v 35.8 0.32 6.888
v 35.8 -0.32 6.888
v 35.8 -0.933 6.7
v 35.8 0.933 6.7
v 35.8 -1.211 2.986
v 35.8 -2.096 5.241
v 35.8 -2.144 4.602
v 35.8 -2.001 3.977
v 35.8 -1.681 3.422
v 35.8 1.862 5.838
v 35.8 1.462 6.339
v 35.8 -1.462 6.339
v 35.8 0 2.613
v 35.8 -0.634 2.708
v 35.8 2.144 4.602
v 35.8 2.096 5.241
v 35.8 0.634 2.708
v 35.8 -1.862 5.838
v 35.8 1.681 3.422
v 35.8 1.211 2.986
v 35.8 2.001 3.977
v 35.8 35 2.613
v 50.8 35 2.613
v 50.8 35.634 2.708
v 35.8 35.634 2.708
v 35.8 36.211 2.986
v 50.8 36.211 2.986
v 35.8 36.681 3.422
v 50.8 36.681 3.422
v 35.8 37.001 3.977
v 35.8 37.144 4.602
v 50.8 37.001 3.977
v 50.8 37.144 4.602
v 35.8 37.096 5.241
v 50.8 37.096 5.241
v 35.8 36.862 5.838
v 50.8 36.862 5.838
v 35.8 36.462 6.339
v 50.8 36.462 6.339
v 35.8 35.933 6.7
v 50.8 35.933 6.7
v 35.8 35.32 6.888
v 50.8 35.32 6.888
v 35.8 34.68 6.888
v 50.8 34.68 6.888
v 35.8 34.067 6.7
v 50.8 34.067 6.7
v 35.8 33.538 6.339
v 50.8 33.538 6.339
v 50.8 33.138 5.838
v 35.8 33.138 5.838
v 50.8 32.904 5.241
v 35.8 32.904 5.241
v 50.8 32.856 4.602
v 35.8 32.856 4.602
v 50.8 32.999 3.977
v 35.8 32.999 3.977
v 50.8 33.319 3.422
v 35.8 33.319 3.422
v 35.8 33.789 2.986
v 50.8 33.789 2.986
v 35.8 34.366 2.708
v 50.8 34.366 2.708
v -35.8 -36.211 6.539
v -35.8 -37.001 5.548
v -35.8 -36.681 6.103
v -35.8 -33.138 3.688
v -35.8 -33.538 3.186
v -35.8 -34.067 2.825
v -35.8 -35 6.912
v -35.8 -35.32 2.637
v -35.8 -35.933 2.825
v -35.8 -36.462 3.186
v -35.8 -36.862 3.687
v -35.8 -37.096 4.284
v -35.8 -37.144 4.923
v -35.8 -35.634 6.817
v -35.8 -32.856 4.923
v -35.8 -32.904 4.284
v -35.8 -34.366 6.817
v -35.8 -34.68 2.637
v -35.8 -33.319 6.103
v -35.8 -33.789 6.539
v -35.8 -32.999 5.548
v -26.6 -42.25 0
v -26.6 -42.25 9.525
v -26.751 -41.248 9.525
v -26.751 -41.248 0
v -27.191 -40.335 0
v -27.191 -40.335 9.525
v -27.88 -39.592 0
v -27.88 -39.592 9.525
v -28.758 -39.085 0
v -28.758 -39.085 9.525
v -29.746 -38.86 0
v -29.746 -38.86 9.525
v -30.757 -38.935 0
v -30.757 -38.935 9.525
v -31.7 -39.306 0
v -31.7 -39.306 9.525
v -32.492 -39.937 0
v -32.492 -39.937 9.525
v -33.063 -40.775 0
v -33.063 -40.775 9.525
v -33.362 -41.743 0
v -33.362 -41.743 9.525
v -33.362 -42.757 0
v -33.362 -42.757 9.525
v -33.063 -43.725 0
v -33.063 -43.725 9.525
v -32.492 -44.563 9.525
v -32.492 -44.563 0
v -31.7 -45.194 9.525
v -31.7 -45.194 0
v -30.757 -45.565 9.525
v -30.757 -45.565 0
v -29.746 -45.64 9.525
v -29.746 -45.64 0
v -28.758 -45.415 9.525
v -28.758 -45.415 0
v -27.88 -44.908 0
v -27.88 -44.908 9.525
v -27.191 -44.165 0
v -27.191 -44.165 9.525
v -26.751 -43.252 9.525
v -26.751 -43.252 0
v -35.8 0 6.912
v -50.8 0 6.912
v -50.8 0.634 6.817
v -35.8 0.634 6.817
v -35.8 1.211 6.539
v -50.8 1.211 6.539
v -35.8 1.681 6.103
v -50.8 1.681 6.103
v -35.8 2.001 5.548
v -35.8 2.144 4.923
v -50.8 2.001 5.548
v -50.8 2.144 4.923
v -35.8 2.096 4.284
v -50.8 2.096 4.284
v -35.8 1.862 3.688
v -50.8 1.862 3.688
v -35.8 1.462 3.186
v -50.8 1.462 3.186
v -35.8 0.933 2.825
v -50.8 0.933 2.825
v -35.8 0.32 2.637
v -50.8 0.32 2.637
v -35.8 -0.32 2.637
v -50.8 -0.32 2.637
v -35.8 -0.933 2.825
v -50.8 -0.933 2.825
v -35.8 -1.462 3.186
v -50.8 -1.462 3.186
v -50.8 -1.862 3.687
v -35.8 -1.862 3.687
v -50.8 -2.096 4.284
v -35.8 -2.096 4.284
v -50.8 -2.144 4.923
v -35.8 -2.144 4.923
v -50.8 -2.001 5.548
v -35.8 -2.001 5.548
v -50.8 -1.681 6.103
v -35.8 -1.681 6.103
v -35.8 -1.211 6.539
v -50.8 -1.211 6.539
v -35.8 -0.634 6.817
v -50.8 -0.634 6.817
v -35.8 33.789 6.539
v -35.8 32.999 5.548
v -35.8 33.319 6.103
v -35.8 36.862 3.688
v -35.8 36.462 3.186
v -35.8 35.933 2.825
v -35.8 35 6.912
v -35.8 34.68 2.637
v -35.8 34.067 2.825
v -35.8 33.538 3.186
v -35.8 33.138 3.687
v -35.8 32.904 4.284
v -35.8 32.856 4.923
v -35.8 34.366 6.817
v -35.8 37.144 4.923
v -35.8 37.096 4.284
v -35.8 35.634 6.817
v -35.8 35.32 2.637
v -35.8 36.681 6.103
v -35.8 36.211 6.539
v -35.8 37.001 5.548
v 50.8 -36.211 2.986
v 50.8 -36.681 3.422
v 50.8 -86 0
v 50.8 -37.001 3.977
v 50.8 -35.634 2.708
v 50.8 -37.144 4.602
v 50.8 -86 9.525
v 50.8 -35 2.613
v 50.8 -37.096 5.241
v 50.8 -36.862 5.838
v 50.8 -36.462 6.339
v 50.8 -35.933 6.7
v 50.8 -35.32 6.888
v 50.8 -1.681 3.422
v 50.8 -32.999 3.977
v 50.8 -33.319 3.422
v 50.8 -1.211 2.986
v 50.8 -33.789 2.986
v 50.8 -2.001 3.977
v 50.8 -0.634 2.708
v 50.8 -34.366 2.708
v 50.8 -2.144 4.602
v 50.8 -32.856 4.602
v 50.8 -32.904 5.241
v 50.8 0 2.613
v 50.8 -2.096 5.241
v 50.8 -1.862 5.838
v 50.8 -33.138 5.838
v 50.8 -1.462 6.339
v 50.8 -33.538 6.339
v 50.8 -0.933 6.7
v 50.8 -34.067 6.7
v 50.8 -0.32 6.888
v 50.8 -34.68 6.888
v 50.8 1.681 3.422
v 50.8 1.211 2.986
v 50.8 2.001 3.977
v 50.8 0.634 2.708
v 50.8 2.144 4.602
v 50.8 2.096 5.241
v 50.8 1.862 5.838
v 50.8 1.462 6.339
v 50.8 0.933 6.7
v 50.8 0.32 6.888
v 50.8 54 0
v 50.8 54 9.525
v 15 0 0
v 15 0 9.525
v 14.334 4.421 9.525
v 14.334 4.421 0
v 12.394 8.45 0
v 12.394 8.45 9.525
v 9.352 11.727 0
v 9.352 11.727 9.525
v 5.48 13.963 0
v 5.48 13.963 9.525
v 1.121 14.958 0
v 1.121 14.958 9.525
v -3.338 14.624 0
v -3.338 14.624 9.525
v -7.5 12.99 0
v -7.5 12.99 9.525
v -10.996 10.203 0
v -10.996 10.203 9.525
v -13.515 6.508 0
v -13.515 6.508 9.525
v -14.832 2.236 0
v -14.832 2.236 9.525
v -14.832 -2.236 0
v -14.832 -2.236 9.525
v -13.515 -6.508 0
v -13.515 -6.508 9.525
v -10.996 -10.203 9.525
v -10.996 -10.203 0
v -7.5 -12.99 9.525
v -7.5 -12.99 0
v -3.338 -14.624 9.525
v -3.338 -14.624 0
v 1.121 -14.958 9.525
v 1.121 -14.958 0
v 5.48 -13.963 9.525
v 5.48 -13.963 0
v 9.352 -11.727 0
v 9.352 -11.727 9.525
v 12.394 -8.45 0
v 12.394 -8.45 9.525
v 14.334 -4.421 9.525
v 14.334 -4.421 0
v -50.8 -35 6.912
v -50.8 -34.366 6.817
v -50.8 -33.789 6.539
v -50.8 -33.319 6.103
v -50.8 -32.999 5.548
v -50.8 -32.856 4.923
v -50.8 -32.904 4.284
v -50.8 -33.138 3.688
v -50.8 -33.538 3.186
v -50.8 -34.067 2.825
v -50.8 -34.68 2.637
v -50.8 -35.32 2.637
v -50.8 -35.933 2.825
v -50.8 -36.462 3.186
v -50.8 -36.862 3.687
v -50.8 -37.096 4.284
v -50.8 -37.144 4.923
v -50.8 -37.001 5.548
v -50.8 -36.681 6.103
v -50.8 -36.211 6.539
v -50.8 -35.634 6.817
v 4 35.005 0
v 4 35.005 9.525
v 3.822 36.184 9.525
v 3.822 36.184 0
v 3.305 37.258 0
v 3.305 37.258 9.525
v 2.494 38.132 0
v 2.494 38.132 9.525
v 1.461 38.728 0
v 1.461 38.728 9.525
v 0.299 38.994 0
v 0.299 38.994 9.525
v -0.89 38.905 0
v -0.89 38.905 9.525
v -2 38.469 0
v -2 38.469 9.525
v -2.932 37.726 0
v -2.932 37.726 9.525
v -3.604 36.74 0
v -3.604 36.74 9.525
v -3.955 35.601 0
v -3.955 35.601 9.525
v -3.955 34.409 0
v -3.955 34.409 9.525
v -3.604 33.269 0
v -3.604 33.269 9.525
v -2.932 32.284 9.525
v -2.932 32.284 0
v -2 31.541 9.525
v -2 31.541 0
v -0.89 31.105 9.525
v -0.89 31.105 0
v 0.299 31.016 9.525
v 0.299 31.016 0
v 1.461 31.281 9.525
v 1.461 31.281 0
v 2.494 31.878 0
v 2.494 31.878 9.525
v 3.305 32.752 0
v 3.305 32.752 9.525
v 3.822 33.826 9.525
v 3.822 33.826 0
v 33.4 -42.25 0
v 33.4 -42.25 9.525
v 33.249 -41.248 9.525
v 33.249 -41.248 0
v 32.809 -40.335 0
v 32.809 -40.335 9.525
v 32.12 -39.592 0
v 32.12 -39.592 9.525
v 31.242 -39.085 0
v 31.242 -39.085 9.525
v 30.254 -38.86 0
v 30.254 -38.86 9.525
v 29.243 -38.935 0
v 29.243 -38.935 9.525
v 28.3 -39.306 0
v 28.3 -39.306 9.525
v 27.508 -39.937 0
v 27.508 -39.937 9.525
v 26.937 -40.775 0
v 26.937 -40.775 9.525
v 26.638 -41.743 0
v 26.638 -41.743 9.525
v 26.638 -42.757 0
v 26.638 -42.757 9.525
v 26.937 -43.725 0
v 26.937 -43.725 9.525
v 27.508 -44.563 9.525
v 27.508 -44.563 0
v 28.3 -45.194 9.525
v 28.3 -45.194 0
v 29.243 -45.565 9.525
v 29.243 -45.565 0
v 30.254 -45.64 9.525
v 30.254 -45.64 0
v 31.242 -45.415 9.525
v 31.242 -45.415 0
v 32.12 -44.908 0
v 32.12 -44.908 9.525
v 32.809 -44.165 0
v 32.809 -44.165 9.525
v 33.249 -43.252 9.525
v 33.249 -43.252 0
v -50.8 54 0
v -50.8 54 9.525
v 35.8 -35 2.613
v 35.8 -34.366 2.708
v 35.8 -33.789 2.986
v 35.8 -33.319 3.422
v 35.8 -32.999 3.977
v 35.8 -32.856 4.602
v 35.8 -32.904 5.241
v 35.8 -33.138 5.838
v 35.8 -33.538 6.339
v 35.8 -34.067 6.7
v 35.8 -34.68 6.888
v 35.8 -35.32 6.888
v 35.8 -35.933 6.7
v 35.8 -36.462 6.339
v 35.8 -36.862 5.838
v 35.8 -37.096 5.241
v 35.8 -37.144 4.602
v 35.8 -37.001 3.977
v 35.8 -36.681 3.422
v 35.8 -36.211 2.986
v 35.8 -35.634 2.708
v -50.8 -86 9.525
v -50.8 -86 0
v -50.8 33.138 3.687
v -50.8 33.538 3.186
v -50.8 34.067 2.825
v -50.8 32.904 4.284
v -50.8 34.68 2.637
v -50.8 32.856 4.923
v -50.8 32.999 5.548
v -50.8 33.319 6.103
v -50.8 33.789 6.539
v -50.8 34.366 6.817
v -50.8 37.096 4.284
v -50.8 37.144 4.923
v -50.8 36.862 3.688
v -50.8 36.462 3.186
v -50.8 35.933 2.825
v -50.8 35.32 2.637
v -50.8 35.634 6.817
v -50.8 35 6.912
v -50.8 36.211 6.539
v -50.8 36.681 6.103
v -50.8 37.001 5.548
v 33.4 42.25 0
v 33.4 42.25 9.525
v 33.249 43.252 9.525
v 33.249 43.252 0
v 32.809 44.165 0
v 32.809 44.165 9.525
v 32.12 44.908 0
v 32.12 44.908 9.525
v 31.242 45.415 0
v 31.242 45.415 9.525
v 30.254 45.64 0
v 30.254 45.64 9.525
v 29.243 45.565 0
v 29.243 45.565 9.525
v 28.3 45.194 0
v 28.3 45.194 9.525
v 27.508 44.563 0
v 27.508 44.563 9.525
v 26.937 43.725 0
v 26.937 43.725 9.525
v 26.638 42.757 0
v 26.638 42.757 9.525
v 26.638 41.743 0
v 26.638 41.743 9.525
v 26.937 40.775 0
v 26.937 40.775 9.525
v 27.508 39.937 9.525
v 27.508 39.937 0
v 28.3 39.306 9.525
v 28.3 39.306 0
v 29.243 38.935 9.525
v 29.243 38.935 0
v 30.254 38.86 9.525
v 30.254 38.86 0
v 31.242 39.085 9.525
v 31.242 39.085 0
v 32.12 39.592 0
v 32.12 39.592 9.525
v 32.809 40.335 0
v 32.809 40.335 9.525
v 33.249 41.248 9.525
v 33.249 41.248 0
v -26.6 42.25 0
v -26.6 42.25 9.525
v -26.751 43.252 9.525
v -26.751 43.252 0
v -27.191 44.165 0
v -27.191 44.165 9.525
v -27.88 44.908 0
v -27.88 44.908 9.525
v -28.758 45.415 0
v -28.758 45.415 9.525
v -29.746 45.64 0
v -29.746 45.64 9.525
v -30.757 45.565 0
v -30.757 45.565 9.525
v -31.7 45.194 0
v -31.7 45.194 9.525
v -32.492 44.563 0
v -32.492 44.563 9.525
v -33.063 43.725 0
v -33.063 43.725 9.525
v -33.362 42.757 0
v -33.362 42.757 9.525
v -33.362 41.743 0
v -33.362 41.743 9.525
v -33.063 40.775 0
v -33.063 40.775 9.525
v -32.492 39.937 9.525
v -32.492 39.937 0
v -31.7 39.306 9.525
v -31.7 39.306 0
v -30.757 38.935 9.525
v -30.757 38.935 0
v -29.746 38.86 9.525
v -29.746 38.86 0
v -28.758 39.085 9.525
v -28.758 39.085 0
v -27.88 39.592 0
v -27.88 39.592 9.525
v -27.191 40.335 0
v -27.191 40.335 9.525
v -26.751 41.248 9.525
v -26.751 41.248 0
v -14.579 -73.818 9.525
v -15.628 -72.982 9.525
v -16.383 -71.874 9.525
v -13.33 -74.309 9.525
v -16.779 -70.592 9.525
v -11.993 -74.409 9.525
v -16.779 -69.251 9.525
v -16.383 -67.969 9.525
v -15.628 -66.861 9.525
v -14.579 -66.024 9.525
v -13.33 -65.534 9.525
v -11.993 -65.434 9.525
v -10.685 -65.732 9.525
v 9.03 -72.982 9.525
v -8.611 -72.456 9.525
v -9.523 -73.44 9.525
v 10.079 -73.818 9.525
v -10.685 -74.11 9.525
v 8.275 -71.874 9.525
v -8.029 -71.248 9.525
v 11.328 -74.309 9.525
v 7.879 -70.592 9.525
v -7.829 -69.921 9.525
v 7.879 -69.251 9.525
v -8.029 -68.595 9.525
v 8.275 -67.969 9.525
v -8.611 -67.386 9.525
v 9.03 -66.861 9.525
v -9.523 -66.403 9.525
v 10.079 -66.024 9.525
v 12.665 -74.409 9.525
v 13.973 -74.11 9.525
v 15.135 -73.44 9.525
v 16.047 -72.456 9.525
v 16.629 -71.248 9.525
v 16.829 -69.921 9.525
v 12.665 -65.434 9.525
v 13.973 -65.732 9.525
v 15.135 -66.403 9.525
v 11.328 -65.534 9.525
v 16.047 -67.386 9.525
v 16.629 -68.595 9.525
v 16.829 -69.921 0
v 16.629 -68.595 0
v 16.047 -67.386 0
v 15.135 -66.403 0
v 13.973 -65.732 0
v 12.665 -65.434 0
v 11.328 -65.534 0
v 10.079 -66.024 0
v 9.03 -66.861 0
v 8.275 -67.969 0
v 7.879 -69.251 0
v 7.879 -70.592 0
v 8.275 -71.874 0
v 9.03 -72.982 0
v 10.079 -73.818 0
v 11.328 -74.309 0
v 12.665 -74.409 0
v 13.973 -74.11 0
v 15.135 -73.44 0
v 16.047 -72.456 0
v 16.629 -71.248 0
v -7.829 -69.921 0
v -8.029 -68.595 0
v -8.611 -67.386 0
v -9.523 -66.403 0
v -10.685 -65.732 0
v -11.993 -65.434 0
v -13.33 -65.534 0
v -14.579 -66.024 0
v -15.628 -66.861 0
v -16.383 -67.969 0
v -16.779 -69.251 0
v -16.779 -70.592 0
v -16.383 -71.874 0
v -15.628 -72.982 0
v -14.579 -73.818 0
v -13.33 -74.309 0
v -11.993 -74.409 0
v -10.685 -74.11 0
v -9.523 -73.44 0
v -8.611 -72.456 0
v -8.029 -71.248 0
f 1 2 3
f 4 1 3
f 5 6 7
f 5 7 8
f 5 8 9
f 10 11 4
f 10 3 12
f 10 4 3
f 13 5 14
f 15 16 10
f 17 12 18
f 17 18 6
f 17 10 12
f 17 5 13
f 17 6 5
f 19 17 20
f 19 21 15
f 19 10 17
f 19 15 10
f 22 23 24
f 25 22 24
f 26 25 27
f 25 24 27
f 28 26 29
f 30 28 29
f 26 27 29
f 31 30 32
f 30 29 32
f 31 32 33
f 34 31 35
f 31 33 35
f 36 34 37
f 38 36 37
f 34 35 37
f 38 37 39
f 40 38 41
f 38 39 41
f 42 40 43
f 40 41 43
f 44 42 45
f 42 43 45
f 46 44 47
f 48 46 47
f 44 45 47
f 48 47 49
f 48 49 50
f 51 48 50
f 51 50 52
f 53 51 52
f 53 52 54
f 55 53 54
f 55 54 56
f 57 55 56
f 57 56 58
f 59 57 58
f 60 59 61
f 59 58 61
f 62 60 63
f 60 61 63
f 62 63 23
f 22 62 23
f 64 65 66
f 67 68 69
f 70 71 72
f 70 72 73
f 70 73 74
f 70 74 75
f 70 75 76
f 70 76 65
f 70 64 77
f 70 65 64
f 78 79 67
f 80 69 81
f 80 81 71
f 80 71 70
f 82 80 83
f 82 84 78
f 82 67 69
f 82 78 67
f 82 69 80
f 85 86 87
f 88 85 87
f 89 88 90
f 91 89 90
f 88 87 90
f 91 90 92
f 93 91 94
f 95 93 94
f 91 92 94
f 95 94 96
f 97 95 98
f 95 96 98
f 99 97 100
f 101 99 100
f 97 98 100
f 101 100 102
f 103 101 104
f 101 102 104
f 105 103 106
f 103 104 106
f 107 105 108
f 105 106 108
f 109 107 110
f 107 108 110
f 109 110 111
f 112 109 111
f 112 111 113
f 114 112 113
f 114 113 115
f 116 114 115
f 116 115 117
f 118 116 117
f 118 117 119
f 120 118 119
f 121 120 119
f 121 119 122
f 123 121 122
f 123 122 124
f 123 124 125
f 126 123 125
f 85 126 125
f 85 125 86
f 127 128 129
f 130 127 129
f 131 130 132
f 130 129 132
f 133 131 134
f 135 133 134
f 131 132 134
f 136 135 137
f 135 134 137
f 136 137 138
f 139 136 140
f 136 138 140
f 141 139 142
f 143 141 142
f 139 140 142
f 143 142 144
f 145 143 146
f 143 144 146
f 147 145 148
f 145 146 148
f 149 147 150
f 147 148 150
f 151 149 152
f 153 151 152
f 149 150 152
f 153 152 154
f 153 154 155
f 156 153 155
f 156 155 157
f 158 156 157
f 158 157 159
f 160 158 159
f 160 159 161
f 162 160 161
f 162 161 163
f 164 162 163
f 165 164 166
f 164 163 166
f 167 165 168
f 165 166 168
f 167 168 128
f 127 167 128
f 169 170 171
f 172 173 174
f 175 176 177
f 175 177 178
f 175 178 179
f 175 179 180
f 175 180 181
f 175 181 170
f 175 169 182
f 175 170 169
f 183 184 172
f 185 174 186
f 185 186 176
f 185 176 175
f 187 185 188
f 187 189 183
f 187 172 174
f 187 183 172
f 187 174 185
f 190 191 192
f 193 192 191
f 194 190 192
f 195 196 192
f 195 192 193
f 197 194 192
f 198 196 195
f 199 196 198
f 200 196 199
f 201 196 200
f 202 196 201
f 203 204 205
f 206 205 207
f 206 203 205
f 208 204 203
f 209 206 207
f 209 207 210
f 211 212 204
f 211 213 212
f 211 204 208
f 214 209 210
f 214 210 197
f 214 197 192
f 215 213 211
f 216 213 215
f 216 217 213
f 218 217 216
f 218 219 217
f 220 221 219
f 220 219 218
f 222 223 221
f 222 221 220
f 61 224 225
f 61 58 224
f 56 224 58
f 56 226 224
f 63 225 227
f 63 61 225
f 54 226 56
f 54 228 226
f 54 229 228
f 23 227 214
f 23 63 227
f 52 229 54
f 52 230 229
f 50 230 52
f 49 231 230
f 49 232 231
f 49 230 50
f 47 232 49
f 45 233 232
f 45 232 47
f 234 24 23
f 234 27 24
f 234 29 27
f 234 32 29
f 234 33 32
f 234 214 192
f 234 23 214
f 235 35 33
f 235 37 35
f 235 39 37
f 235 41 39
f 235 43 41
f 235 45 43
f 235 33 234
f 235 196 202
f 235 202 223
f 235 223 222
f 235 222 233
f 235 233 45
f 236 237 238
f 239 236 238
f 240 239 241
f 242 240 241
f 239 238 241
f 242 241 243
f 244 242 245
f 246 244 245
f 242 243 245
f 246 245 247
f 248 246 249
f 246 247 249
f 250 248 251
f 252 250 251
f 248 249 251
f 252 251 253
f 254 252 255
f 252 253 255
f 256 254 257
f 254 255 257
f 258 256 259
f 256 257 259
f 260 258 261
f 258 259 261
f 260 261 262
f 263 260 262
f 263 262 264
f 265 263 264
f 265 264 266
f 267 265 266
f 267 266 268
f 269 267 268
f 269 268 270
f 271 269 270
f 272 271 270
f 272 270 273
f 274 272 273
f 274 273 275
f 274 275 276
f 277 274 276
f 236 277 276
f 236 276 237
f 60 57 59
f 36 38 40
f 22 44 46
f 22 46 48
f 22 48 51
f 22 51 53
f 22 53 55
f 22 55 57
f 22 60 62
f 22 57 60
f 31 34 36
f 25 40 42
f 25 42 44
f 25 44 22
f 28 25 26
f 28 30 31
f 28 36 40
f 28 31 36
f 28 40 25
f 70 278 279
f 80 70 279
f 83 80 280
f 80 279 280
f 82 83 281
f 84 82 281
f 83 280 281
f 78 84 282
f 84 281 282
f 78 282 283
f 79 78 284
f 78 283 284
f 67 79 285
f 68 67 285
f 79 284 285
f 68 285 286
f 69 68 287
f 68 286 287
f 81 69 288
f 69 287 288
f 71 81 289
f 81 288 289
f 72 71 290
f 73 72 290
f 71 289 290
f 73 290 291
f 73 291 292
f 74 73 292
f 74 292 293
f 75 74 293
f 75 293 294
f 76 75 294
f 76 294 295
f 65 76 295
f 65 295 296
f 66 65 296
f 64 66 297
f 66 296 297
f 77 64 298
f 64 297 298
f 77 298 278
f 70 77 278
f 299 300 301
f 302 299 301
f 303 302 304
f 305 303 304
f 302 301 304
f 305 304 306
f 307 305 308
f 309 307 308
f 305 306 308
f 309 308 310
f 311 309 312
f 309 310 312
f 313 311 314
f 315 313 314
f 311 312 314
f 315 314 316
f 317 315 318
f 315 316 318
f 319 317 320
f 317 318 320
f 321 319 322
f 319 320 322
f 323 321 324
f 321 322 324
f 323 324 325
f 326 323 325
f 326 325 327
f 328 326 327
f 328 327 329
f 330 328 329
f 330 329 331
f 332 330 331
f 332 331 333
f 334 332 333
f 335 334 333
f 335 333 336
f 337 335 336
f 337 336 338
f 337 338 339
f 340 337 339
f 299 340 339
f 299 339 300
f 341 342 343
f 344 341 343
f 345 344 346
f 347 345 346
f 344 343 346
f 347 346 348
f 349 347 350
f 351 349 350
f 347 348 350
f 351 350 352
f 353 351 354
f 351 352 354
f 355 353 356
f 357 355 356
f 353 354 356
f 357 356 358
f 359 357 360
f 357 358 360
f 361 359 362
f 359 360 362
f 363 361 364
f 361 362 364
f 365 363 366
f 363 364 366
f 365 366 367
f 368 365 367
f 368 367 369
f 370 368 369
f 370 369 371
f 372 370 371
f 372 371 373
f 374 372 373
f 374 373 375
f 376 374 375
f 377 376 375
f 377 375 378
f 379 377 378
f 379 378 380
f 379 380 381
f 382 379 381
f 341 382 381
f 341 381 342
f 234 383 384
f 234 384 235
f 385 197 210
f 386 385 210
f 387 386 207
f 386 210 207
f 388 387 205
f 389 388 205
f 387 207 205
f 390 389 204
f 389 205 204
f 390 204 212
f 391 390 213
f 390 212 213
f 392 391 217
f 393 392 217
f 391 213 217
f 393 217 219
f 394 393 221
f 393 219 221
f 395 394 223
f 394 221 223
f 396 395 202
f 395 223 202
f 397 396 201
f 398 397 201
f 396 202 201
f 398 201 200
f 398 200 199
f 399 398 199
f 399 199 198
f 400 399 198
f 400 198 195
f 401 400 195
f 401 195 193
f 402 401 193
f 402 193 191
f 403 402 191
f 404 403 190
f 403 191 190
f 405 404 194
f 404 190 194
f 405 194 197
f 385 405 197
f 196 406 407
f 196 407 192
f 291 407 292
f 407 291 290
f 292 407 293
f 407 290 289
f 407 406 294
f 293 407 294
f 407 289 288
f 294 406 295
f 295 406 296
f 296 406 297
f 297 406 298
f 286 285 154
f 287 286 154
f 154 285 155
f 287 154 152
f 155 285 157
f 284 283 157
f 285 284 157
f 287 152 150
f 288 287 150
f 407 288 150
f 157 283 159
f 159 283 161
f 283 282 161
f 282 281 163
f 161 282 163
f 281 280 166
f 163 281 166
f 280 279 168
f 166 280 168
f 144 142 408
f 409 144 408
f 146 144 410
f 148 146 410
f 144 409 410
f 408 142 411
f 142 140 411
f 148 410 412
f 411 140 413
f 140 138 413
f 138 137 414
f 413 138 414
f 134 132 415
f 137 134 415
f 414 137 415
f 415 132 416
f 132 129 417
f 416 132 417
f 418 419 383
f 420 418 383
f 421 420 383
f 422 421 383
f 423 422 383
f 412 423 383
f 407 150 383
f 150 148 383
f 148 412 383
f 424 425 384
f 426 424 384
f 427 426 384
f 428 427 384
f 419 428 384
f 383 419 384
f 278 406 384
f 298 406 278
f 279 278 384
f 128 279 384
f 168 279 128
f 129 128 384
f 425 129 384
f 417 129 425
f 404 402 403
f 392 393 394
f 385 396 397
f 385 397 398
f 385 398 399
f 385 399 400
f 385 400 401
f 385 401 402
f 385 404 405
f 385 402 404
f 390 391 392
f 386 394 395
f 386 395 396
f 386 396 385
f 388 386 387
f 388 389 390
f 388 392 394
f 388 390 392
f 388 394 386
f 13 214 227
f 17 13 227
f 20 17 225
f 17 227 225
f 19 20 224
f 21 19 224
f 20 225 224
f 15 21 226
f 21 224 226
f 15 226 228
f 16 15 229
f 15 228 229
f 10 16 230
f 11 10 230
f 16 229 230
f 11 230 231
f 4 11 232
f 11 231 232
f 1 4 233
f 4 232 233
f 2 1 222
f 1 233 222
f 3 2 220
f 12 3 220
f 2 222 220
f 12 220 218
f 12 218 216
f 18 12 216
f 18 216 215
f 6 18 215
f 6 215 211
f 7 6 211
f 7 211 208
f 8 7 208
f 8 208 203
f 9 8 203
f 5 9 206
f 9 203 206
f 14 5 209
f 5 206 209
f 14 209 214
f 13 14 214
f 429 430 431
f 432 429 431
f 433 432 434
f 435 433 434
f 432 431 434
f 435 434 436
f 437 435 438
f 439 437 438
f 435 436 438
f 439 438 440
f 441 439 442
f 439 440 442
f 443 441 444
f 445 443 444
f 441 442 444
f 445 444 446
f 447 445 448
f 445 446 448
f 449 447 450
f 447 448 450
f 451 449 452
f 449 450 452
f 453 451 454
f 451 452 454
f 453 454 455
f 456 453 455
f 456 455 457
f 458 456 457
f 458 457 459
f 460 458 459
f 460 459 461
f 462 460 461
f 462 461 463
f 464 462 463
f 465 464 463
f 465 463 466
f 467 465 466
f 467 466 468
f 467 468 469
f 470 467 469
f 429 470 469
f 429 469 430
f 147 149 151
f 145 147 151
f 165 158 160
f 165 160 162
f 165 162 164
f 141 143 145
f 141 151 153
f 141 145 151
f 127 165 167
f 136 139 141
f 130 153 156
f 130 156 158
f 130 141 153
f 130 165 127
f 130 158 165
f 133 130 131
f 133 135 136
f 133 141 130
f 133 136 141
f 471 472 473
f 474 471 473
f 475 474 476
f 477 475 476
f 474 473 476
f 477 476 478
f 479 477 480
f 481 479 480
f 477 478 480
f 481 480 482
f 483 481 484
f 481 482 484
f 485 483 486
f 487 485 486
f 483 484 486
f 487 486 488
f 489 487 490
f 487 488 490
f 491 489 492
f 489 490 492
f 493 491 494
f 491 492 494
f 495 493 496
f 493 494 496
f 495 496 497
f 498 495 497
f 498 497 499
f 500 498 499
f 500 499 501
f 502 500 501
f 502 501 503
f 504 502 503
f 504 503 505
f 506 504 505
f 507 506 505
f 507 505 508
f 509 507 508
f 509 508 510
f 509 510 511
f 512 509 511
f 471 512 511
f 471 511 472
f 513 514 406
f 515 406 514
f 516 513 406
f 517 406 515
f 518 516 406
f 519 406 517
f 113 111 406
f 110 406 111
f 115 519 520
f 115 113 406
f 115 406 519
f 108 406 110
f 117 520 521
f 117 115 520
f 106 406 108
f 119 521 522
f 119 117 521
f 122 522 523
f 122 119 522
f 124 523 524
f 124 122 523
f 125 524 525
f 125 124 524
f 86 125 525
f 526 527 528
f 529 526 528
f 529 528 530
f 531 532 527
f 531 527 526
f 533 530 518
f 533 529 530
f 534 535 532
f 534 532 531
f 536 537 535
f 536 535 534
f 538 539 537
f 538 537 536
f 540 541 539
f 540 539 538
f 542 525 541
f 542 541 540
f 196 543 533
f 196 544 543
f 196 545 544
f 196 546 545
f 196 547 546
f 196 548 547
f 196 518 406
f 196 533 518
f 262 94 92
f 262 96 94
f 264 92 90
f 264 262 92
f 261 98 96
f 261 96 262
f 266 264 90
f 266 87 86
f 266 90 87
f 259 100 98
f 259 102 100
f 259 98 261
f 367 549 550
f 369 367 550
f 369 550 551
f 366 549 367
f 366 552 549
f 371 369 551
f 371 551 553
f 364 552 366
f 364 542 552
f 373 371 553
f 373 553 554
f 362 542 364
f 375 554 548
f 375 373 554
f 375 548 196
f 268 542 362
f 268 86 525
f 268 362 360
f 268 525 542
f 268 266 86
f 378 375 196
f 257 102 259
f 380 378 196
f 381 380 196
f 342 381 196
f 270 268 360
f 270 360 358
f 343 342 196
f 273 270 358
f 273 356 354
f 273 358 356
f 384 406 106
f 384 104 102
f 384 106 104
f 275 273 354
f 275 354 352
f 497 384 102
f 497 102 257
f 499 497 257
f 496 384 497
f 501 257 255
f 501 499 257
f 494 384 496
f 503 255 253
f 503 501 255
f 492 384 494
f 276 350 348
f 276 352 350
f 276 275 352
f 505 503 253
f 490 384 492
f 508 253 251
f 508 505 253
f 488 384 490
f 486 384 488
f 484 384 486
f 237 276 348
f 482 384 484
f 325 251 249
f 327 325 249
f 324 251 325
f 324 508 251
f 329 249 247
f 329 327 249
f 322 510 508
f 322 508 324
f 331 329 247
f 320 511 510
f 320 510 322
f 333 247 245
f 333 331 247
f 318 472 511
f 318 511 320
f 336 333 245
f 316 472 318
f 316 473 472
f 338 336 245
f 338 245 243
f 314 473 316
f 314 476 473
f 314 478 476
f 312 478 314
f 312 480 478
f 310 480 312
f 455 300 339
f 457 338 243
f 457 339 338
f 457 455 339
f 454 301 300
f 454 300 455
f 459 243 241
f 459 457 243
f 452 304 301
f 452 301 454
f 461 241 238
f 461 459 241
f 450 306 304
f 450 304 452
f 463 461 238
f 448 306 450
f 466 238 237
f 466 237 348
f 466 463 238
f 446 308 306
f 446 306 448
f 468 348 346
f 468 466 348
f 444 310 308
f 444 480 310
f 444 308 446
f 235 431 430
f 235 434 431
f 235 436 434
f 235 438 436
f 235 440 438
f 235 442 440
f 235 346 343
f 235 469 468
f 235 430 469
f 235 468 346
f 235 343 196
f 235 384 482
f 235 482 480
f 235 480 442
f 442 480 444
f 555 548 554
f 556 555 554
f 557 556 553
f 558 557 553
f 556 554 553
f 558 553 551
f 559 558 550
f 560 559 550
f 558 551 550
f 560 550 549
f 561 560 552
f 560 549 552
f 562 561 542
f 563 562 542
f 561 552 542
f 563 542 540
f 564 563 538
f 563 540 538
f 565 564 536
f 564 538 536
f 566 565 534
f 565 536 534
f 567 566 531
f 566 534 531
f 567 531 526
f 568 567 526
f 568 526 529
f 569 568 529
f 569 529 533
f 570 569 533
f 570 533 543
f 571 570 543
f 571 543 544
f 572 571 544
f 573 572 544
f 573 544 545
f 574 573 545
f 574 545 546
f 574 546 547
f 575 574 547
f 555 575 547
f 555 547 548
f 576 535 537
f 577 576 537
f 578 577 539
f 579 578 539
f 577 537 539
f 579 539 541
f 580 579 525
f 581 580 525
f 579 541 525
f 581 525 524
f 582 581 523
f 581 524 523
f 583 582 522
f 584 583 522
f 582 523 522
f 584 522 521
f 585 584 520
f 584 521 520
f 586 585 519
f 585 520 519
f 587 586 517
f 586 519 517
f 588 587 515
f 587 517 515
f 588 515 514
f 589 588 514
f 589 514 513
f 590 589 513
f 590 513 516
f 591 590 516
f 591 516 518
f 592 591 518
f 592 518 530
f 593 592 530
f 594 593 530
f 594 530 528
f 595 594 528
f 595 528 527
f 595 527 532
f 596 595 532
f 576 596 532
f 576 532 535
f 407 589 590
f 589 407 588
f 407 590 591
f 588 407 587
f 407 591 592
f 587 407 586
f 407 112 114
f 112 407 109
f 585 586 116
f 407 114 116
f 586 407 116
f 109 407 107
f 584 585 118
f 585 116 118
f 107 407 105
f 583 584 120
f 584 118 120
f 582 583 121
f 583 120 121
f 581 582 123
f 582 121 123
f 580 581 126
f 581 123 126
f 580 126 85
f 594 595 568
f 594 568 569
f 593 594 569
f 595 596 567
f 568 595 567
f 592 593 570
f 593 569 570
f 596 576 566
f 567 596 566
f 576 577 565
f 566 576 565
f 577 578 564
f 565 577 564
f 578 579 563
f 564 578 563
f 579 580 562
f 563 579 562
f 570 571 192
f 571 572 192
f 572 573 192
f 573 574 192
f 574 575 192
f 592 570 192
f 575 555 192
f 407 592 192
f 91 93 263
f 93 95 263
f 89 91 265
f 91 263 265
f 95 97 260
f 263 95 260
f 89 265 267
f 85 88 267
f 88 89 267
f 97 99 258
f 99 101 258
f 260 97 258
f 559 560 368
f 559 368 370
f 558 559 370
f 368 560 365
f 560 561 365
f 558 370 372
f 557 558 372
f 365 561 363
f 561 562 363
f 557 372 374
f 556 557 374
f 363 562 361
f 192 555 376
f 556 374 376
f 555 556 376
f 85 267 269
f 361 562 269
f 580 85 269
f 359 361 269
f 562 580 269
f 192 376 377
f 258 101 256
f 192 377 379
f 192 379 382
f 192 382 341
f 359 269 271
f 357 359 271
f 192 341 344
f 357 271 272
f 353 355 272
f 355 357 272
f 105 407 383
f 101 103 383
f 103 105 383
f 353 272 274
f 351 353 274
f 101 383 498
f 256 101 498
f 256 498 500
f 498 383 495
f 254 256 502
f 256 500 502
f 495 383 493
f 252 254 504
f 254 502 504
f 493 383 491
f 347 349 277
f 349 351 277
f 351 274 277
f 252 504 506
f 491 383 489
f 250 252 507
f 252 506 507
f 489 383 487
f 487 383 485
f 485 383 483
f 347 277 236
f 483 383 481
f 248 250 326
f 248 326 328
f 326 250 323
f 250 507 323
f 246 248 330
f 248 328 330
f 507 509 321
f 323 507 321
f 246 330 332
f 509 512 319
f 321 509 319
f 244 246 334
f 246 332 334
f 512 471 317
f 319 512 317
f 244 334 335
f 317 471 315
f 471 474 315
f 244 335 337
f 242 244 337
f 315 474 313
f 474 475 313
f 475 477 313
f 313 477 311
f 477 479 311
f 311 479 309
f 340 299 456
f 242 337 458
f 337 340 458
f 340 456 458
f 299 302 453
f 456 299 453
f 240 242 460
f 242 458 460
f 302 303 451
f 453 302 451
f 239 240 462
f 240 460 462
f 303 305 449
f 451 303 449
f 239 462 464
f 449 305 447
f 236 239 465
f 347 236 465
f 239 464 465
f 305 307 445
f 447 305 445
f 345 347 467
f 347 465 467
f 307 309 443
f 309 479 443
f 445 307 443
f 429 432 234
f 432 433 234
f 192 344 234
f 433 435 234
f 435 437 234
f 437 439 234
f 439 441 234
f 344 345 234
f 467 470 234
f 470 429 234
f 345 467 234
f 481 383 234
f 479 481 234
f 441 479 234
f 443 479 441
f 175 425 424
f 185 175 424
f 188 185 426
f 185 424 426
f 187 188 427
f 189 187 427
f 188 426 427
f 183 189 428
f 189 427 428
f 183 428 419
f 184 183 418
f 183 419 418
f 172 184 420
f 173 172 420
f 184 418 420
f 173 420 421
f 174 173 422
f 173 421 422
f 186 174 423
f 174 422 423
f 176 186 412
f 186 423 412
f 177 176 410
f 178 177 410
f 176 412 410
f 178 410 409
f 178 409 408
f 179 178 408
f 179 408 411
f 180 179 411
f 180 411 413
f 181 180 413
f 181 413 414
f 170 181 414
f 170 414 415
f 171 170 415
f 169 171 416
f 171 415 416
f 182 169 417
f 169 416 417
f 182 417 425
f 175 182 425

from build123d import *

# Parameters (mm, degrees)
CROQUIS1_W              = 101.6
CROQUIS1_H              = 108
SALIENTE_EXTRUIR1_DEPTH = 9.525
CROQUIS2_R              = 15
CROQUIS2_R_2            = 3.4
CORTAR_EXTRUIR1_DEPTH   = 10.525
CROQUIS3_R              = 2.15
CORTAR_EXTRUIR2_DEPTH   = 15
CROQUIS4_R              = 2.15
CORTAR_EXTRUIR3_DEPTH   = 15
CROQUIS5_W              = 101.6
CROQUIS5_H              = 32
SALIENTE_EXTRUIR2_DEPTH = 9.525
CROQUIS6_R              = 4.5
CROQUIS6_R_2            = 4
CORTAR_EXTRUIR4_DEPTH   = 101.6


with BuildPart() as part:
    # Croquis1 → Saliente-Extruir1 (new body)
    with BuildSketch(Plane.XY):
        Rectangle(CROQUIS1_W, CROQUIS1_H)
    extrude(amount=SALIENTE_EXTRUIR1_DEPTH)

    # Croquis2 → Cortar-Extruir1 (cut, through all)
    with BuildSketch(Plane.XY.offset(9.525)):
        Circle(CROQUIS2_R)
        with Locations((30, -42.25)):
            Circle(CROQUIS2_R_2)
        with Locations((-30, -42.25)):
            Circle(CROQUIS2_R_2)
        with Locations((30, 42.25)):
            Circle(CROQUIS2_R_2)
        with Locations((-30, 42.25)):
            Circle(CROQUIS2_R_2)
    extrude(amount=-CORTAR_EXTRUIR1_DEPTH, mode=Mode.SUBTRACT)

    # Croquis3 → Cortar-Extruir2 (cut)
    with BuildSketch(Plane.ZY.offset(50.8)):
        with Locations((4.7625, 0)):
            Circle(CROQUIS3_R)
        with Locations((4.7625, -35)):
            Circle(CROQUIS3_R)
        with Locations((4.7625, 35)):
            Circle(CROQUIS3_R)
    extrude(amount=-CORTAR_EXTRUIR2_DEPTH, mode=Mode.SUBTRACT)

    # Croquis4 → Cortar-Extruir3 (cut)
    with BuildSketch(Plane(origin=(50.8, 0, 0), x_dir=(0, 0, -1), z_dir=(1, 0, 0))):
        with Locations((-4.7625, 0)):
            Circle(CROQUIS4_R)
        with Locations((-4.7625, -35)):
            Circle(CROQUIS4_R)
        with Locations((-4.7625, 35)):
            Circle(CROQUIS4_R)
    extrude(amount=-CORTAR_EXTRUIR3_DEPTH, mode=Mode.SUBTRACT)

    # Croquis5 → Saliente-Extruir2 (add)
    with BuildSketch(Plane.XY.offset(9.525)):
        with Locations((0, -70)):
            Rectangle(CROQUIS5_W, CROQUIS5_H)
    extrude(amount=-SALIENTE_EXTRUIR2_DEPTH)

    # Croquis6 → Cortar-Extruir4 (cut)
    with BuildSketch(Plane.XY.offset(9.525)):
        with Locations((12.329020614, -69.921350464)):
            Circle(CROQUIS6_R)
        with Locations((-12.329020614, -69.921350464)):
            Circle(CROQUIS6_R)
        with Locations((0, 35.004884714)):
            Circle(CROQUIS6_R_2)
    extrude(amount=-CORTAR_EXTRUIR4_DEPTH, mode=Mode.SUBTRACT)


solid = part.part
